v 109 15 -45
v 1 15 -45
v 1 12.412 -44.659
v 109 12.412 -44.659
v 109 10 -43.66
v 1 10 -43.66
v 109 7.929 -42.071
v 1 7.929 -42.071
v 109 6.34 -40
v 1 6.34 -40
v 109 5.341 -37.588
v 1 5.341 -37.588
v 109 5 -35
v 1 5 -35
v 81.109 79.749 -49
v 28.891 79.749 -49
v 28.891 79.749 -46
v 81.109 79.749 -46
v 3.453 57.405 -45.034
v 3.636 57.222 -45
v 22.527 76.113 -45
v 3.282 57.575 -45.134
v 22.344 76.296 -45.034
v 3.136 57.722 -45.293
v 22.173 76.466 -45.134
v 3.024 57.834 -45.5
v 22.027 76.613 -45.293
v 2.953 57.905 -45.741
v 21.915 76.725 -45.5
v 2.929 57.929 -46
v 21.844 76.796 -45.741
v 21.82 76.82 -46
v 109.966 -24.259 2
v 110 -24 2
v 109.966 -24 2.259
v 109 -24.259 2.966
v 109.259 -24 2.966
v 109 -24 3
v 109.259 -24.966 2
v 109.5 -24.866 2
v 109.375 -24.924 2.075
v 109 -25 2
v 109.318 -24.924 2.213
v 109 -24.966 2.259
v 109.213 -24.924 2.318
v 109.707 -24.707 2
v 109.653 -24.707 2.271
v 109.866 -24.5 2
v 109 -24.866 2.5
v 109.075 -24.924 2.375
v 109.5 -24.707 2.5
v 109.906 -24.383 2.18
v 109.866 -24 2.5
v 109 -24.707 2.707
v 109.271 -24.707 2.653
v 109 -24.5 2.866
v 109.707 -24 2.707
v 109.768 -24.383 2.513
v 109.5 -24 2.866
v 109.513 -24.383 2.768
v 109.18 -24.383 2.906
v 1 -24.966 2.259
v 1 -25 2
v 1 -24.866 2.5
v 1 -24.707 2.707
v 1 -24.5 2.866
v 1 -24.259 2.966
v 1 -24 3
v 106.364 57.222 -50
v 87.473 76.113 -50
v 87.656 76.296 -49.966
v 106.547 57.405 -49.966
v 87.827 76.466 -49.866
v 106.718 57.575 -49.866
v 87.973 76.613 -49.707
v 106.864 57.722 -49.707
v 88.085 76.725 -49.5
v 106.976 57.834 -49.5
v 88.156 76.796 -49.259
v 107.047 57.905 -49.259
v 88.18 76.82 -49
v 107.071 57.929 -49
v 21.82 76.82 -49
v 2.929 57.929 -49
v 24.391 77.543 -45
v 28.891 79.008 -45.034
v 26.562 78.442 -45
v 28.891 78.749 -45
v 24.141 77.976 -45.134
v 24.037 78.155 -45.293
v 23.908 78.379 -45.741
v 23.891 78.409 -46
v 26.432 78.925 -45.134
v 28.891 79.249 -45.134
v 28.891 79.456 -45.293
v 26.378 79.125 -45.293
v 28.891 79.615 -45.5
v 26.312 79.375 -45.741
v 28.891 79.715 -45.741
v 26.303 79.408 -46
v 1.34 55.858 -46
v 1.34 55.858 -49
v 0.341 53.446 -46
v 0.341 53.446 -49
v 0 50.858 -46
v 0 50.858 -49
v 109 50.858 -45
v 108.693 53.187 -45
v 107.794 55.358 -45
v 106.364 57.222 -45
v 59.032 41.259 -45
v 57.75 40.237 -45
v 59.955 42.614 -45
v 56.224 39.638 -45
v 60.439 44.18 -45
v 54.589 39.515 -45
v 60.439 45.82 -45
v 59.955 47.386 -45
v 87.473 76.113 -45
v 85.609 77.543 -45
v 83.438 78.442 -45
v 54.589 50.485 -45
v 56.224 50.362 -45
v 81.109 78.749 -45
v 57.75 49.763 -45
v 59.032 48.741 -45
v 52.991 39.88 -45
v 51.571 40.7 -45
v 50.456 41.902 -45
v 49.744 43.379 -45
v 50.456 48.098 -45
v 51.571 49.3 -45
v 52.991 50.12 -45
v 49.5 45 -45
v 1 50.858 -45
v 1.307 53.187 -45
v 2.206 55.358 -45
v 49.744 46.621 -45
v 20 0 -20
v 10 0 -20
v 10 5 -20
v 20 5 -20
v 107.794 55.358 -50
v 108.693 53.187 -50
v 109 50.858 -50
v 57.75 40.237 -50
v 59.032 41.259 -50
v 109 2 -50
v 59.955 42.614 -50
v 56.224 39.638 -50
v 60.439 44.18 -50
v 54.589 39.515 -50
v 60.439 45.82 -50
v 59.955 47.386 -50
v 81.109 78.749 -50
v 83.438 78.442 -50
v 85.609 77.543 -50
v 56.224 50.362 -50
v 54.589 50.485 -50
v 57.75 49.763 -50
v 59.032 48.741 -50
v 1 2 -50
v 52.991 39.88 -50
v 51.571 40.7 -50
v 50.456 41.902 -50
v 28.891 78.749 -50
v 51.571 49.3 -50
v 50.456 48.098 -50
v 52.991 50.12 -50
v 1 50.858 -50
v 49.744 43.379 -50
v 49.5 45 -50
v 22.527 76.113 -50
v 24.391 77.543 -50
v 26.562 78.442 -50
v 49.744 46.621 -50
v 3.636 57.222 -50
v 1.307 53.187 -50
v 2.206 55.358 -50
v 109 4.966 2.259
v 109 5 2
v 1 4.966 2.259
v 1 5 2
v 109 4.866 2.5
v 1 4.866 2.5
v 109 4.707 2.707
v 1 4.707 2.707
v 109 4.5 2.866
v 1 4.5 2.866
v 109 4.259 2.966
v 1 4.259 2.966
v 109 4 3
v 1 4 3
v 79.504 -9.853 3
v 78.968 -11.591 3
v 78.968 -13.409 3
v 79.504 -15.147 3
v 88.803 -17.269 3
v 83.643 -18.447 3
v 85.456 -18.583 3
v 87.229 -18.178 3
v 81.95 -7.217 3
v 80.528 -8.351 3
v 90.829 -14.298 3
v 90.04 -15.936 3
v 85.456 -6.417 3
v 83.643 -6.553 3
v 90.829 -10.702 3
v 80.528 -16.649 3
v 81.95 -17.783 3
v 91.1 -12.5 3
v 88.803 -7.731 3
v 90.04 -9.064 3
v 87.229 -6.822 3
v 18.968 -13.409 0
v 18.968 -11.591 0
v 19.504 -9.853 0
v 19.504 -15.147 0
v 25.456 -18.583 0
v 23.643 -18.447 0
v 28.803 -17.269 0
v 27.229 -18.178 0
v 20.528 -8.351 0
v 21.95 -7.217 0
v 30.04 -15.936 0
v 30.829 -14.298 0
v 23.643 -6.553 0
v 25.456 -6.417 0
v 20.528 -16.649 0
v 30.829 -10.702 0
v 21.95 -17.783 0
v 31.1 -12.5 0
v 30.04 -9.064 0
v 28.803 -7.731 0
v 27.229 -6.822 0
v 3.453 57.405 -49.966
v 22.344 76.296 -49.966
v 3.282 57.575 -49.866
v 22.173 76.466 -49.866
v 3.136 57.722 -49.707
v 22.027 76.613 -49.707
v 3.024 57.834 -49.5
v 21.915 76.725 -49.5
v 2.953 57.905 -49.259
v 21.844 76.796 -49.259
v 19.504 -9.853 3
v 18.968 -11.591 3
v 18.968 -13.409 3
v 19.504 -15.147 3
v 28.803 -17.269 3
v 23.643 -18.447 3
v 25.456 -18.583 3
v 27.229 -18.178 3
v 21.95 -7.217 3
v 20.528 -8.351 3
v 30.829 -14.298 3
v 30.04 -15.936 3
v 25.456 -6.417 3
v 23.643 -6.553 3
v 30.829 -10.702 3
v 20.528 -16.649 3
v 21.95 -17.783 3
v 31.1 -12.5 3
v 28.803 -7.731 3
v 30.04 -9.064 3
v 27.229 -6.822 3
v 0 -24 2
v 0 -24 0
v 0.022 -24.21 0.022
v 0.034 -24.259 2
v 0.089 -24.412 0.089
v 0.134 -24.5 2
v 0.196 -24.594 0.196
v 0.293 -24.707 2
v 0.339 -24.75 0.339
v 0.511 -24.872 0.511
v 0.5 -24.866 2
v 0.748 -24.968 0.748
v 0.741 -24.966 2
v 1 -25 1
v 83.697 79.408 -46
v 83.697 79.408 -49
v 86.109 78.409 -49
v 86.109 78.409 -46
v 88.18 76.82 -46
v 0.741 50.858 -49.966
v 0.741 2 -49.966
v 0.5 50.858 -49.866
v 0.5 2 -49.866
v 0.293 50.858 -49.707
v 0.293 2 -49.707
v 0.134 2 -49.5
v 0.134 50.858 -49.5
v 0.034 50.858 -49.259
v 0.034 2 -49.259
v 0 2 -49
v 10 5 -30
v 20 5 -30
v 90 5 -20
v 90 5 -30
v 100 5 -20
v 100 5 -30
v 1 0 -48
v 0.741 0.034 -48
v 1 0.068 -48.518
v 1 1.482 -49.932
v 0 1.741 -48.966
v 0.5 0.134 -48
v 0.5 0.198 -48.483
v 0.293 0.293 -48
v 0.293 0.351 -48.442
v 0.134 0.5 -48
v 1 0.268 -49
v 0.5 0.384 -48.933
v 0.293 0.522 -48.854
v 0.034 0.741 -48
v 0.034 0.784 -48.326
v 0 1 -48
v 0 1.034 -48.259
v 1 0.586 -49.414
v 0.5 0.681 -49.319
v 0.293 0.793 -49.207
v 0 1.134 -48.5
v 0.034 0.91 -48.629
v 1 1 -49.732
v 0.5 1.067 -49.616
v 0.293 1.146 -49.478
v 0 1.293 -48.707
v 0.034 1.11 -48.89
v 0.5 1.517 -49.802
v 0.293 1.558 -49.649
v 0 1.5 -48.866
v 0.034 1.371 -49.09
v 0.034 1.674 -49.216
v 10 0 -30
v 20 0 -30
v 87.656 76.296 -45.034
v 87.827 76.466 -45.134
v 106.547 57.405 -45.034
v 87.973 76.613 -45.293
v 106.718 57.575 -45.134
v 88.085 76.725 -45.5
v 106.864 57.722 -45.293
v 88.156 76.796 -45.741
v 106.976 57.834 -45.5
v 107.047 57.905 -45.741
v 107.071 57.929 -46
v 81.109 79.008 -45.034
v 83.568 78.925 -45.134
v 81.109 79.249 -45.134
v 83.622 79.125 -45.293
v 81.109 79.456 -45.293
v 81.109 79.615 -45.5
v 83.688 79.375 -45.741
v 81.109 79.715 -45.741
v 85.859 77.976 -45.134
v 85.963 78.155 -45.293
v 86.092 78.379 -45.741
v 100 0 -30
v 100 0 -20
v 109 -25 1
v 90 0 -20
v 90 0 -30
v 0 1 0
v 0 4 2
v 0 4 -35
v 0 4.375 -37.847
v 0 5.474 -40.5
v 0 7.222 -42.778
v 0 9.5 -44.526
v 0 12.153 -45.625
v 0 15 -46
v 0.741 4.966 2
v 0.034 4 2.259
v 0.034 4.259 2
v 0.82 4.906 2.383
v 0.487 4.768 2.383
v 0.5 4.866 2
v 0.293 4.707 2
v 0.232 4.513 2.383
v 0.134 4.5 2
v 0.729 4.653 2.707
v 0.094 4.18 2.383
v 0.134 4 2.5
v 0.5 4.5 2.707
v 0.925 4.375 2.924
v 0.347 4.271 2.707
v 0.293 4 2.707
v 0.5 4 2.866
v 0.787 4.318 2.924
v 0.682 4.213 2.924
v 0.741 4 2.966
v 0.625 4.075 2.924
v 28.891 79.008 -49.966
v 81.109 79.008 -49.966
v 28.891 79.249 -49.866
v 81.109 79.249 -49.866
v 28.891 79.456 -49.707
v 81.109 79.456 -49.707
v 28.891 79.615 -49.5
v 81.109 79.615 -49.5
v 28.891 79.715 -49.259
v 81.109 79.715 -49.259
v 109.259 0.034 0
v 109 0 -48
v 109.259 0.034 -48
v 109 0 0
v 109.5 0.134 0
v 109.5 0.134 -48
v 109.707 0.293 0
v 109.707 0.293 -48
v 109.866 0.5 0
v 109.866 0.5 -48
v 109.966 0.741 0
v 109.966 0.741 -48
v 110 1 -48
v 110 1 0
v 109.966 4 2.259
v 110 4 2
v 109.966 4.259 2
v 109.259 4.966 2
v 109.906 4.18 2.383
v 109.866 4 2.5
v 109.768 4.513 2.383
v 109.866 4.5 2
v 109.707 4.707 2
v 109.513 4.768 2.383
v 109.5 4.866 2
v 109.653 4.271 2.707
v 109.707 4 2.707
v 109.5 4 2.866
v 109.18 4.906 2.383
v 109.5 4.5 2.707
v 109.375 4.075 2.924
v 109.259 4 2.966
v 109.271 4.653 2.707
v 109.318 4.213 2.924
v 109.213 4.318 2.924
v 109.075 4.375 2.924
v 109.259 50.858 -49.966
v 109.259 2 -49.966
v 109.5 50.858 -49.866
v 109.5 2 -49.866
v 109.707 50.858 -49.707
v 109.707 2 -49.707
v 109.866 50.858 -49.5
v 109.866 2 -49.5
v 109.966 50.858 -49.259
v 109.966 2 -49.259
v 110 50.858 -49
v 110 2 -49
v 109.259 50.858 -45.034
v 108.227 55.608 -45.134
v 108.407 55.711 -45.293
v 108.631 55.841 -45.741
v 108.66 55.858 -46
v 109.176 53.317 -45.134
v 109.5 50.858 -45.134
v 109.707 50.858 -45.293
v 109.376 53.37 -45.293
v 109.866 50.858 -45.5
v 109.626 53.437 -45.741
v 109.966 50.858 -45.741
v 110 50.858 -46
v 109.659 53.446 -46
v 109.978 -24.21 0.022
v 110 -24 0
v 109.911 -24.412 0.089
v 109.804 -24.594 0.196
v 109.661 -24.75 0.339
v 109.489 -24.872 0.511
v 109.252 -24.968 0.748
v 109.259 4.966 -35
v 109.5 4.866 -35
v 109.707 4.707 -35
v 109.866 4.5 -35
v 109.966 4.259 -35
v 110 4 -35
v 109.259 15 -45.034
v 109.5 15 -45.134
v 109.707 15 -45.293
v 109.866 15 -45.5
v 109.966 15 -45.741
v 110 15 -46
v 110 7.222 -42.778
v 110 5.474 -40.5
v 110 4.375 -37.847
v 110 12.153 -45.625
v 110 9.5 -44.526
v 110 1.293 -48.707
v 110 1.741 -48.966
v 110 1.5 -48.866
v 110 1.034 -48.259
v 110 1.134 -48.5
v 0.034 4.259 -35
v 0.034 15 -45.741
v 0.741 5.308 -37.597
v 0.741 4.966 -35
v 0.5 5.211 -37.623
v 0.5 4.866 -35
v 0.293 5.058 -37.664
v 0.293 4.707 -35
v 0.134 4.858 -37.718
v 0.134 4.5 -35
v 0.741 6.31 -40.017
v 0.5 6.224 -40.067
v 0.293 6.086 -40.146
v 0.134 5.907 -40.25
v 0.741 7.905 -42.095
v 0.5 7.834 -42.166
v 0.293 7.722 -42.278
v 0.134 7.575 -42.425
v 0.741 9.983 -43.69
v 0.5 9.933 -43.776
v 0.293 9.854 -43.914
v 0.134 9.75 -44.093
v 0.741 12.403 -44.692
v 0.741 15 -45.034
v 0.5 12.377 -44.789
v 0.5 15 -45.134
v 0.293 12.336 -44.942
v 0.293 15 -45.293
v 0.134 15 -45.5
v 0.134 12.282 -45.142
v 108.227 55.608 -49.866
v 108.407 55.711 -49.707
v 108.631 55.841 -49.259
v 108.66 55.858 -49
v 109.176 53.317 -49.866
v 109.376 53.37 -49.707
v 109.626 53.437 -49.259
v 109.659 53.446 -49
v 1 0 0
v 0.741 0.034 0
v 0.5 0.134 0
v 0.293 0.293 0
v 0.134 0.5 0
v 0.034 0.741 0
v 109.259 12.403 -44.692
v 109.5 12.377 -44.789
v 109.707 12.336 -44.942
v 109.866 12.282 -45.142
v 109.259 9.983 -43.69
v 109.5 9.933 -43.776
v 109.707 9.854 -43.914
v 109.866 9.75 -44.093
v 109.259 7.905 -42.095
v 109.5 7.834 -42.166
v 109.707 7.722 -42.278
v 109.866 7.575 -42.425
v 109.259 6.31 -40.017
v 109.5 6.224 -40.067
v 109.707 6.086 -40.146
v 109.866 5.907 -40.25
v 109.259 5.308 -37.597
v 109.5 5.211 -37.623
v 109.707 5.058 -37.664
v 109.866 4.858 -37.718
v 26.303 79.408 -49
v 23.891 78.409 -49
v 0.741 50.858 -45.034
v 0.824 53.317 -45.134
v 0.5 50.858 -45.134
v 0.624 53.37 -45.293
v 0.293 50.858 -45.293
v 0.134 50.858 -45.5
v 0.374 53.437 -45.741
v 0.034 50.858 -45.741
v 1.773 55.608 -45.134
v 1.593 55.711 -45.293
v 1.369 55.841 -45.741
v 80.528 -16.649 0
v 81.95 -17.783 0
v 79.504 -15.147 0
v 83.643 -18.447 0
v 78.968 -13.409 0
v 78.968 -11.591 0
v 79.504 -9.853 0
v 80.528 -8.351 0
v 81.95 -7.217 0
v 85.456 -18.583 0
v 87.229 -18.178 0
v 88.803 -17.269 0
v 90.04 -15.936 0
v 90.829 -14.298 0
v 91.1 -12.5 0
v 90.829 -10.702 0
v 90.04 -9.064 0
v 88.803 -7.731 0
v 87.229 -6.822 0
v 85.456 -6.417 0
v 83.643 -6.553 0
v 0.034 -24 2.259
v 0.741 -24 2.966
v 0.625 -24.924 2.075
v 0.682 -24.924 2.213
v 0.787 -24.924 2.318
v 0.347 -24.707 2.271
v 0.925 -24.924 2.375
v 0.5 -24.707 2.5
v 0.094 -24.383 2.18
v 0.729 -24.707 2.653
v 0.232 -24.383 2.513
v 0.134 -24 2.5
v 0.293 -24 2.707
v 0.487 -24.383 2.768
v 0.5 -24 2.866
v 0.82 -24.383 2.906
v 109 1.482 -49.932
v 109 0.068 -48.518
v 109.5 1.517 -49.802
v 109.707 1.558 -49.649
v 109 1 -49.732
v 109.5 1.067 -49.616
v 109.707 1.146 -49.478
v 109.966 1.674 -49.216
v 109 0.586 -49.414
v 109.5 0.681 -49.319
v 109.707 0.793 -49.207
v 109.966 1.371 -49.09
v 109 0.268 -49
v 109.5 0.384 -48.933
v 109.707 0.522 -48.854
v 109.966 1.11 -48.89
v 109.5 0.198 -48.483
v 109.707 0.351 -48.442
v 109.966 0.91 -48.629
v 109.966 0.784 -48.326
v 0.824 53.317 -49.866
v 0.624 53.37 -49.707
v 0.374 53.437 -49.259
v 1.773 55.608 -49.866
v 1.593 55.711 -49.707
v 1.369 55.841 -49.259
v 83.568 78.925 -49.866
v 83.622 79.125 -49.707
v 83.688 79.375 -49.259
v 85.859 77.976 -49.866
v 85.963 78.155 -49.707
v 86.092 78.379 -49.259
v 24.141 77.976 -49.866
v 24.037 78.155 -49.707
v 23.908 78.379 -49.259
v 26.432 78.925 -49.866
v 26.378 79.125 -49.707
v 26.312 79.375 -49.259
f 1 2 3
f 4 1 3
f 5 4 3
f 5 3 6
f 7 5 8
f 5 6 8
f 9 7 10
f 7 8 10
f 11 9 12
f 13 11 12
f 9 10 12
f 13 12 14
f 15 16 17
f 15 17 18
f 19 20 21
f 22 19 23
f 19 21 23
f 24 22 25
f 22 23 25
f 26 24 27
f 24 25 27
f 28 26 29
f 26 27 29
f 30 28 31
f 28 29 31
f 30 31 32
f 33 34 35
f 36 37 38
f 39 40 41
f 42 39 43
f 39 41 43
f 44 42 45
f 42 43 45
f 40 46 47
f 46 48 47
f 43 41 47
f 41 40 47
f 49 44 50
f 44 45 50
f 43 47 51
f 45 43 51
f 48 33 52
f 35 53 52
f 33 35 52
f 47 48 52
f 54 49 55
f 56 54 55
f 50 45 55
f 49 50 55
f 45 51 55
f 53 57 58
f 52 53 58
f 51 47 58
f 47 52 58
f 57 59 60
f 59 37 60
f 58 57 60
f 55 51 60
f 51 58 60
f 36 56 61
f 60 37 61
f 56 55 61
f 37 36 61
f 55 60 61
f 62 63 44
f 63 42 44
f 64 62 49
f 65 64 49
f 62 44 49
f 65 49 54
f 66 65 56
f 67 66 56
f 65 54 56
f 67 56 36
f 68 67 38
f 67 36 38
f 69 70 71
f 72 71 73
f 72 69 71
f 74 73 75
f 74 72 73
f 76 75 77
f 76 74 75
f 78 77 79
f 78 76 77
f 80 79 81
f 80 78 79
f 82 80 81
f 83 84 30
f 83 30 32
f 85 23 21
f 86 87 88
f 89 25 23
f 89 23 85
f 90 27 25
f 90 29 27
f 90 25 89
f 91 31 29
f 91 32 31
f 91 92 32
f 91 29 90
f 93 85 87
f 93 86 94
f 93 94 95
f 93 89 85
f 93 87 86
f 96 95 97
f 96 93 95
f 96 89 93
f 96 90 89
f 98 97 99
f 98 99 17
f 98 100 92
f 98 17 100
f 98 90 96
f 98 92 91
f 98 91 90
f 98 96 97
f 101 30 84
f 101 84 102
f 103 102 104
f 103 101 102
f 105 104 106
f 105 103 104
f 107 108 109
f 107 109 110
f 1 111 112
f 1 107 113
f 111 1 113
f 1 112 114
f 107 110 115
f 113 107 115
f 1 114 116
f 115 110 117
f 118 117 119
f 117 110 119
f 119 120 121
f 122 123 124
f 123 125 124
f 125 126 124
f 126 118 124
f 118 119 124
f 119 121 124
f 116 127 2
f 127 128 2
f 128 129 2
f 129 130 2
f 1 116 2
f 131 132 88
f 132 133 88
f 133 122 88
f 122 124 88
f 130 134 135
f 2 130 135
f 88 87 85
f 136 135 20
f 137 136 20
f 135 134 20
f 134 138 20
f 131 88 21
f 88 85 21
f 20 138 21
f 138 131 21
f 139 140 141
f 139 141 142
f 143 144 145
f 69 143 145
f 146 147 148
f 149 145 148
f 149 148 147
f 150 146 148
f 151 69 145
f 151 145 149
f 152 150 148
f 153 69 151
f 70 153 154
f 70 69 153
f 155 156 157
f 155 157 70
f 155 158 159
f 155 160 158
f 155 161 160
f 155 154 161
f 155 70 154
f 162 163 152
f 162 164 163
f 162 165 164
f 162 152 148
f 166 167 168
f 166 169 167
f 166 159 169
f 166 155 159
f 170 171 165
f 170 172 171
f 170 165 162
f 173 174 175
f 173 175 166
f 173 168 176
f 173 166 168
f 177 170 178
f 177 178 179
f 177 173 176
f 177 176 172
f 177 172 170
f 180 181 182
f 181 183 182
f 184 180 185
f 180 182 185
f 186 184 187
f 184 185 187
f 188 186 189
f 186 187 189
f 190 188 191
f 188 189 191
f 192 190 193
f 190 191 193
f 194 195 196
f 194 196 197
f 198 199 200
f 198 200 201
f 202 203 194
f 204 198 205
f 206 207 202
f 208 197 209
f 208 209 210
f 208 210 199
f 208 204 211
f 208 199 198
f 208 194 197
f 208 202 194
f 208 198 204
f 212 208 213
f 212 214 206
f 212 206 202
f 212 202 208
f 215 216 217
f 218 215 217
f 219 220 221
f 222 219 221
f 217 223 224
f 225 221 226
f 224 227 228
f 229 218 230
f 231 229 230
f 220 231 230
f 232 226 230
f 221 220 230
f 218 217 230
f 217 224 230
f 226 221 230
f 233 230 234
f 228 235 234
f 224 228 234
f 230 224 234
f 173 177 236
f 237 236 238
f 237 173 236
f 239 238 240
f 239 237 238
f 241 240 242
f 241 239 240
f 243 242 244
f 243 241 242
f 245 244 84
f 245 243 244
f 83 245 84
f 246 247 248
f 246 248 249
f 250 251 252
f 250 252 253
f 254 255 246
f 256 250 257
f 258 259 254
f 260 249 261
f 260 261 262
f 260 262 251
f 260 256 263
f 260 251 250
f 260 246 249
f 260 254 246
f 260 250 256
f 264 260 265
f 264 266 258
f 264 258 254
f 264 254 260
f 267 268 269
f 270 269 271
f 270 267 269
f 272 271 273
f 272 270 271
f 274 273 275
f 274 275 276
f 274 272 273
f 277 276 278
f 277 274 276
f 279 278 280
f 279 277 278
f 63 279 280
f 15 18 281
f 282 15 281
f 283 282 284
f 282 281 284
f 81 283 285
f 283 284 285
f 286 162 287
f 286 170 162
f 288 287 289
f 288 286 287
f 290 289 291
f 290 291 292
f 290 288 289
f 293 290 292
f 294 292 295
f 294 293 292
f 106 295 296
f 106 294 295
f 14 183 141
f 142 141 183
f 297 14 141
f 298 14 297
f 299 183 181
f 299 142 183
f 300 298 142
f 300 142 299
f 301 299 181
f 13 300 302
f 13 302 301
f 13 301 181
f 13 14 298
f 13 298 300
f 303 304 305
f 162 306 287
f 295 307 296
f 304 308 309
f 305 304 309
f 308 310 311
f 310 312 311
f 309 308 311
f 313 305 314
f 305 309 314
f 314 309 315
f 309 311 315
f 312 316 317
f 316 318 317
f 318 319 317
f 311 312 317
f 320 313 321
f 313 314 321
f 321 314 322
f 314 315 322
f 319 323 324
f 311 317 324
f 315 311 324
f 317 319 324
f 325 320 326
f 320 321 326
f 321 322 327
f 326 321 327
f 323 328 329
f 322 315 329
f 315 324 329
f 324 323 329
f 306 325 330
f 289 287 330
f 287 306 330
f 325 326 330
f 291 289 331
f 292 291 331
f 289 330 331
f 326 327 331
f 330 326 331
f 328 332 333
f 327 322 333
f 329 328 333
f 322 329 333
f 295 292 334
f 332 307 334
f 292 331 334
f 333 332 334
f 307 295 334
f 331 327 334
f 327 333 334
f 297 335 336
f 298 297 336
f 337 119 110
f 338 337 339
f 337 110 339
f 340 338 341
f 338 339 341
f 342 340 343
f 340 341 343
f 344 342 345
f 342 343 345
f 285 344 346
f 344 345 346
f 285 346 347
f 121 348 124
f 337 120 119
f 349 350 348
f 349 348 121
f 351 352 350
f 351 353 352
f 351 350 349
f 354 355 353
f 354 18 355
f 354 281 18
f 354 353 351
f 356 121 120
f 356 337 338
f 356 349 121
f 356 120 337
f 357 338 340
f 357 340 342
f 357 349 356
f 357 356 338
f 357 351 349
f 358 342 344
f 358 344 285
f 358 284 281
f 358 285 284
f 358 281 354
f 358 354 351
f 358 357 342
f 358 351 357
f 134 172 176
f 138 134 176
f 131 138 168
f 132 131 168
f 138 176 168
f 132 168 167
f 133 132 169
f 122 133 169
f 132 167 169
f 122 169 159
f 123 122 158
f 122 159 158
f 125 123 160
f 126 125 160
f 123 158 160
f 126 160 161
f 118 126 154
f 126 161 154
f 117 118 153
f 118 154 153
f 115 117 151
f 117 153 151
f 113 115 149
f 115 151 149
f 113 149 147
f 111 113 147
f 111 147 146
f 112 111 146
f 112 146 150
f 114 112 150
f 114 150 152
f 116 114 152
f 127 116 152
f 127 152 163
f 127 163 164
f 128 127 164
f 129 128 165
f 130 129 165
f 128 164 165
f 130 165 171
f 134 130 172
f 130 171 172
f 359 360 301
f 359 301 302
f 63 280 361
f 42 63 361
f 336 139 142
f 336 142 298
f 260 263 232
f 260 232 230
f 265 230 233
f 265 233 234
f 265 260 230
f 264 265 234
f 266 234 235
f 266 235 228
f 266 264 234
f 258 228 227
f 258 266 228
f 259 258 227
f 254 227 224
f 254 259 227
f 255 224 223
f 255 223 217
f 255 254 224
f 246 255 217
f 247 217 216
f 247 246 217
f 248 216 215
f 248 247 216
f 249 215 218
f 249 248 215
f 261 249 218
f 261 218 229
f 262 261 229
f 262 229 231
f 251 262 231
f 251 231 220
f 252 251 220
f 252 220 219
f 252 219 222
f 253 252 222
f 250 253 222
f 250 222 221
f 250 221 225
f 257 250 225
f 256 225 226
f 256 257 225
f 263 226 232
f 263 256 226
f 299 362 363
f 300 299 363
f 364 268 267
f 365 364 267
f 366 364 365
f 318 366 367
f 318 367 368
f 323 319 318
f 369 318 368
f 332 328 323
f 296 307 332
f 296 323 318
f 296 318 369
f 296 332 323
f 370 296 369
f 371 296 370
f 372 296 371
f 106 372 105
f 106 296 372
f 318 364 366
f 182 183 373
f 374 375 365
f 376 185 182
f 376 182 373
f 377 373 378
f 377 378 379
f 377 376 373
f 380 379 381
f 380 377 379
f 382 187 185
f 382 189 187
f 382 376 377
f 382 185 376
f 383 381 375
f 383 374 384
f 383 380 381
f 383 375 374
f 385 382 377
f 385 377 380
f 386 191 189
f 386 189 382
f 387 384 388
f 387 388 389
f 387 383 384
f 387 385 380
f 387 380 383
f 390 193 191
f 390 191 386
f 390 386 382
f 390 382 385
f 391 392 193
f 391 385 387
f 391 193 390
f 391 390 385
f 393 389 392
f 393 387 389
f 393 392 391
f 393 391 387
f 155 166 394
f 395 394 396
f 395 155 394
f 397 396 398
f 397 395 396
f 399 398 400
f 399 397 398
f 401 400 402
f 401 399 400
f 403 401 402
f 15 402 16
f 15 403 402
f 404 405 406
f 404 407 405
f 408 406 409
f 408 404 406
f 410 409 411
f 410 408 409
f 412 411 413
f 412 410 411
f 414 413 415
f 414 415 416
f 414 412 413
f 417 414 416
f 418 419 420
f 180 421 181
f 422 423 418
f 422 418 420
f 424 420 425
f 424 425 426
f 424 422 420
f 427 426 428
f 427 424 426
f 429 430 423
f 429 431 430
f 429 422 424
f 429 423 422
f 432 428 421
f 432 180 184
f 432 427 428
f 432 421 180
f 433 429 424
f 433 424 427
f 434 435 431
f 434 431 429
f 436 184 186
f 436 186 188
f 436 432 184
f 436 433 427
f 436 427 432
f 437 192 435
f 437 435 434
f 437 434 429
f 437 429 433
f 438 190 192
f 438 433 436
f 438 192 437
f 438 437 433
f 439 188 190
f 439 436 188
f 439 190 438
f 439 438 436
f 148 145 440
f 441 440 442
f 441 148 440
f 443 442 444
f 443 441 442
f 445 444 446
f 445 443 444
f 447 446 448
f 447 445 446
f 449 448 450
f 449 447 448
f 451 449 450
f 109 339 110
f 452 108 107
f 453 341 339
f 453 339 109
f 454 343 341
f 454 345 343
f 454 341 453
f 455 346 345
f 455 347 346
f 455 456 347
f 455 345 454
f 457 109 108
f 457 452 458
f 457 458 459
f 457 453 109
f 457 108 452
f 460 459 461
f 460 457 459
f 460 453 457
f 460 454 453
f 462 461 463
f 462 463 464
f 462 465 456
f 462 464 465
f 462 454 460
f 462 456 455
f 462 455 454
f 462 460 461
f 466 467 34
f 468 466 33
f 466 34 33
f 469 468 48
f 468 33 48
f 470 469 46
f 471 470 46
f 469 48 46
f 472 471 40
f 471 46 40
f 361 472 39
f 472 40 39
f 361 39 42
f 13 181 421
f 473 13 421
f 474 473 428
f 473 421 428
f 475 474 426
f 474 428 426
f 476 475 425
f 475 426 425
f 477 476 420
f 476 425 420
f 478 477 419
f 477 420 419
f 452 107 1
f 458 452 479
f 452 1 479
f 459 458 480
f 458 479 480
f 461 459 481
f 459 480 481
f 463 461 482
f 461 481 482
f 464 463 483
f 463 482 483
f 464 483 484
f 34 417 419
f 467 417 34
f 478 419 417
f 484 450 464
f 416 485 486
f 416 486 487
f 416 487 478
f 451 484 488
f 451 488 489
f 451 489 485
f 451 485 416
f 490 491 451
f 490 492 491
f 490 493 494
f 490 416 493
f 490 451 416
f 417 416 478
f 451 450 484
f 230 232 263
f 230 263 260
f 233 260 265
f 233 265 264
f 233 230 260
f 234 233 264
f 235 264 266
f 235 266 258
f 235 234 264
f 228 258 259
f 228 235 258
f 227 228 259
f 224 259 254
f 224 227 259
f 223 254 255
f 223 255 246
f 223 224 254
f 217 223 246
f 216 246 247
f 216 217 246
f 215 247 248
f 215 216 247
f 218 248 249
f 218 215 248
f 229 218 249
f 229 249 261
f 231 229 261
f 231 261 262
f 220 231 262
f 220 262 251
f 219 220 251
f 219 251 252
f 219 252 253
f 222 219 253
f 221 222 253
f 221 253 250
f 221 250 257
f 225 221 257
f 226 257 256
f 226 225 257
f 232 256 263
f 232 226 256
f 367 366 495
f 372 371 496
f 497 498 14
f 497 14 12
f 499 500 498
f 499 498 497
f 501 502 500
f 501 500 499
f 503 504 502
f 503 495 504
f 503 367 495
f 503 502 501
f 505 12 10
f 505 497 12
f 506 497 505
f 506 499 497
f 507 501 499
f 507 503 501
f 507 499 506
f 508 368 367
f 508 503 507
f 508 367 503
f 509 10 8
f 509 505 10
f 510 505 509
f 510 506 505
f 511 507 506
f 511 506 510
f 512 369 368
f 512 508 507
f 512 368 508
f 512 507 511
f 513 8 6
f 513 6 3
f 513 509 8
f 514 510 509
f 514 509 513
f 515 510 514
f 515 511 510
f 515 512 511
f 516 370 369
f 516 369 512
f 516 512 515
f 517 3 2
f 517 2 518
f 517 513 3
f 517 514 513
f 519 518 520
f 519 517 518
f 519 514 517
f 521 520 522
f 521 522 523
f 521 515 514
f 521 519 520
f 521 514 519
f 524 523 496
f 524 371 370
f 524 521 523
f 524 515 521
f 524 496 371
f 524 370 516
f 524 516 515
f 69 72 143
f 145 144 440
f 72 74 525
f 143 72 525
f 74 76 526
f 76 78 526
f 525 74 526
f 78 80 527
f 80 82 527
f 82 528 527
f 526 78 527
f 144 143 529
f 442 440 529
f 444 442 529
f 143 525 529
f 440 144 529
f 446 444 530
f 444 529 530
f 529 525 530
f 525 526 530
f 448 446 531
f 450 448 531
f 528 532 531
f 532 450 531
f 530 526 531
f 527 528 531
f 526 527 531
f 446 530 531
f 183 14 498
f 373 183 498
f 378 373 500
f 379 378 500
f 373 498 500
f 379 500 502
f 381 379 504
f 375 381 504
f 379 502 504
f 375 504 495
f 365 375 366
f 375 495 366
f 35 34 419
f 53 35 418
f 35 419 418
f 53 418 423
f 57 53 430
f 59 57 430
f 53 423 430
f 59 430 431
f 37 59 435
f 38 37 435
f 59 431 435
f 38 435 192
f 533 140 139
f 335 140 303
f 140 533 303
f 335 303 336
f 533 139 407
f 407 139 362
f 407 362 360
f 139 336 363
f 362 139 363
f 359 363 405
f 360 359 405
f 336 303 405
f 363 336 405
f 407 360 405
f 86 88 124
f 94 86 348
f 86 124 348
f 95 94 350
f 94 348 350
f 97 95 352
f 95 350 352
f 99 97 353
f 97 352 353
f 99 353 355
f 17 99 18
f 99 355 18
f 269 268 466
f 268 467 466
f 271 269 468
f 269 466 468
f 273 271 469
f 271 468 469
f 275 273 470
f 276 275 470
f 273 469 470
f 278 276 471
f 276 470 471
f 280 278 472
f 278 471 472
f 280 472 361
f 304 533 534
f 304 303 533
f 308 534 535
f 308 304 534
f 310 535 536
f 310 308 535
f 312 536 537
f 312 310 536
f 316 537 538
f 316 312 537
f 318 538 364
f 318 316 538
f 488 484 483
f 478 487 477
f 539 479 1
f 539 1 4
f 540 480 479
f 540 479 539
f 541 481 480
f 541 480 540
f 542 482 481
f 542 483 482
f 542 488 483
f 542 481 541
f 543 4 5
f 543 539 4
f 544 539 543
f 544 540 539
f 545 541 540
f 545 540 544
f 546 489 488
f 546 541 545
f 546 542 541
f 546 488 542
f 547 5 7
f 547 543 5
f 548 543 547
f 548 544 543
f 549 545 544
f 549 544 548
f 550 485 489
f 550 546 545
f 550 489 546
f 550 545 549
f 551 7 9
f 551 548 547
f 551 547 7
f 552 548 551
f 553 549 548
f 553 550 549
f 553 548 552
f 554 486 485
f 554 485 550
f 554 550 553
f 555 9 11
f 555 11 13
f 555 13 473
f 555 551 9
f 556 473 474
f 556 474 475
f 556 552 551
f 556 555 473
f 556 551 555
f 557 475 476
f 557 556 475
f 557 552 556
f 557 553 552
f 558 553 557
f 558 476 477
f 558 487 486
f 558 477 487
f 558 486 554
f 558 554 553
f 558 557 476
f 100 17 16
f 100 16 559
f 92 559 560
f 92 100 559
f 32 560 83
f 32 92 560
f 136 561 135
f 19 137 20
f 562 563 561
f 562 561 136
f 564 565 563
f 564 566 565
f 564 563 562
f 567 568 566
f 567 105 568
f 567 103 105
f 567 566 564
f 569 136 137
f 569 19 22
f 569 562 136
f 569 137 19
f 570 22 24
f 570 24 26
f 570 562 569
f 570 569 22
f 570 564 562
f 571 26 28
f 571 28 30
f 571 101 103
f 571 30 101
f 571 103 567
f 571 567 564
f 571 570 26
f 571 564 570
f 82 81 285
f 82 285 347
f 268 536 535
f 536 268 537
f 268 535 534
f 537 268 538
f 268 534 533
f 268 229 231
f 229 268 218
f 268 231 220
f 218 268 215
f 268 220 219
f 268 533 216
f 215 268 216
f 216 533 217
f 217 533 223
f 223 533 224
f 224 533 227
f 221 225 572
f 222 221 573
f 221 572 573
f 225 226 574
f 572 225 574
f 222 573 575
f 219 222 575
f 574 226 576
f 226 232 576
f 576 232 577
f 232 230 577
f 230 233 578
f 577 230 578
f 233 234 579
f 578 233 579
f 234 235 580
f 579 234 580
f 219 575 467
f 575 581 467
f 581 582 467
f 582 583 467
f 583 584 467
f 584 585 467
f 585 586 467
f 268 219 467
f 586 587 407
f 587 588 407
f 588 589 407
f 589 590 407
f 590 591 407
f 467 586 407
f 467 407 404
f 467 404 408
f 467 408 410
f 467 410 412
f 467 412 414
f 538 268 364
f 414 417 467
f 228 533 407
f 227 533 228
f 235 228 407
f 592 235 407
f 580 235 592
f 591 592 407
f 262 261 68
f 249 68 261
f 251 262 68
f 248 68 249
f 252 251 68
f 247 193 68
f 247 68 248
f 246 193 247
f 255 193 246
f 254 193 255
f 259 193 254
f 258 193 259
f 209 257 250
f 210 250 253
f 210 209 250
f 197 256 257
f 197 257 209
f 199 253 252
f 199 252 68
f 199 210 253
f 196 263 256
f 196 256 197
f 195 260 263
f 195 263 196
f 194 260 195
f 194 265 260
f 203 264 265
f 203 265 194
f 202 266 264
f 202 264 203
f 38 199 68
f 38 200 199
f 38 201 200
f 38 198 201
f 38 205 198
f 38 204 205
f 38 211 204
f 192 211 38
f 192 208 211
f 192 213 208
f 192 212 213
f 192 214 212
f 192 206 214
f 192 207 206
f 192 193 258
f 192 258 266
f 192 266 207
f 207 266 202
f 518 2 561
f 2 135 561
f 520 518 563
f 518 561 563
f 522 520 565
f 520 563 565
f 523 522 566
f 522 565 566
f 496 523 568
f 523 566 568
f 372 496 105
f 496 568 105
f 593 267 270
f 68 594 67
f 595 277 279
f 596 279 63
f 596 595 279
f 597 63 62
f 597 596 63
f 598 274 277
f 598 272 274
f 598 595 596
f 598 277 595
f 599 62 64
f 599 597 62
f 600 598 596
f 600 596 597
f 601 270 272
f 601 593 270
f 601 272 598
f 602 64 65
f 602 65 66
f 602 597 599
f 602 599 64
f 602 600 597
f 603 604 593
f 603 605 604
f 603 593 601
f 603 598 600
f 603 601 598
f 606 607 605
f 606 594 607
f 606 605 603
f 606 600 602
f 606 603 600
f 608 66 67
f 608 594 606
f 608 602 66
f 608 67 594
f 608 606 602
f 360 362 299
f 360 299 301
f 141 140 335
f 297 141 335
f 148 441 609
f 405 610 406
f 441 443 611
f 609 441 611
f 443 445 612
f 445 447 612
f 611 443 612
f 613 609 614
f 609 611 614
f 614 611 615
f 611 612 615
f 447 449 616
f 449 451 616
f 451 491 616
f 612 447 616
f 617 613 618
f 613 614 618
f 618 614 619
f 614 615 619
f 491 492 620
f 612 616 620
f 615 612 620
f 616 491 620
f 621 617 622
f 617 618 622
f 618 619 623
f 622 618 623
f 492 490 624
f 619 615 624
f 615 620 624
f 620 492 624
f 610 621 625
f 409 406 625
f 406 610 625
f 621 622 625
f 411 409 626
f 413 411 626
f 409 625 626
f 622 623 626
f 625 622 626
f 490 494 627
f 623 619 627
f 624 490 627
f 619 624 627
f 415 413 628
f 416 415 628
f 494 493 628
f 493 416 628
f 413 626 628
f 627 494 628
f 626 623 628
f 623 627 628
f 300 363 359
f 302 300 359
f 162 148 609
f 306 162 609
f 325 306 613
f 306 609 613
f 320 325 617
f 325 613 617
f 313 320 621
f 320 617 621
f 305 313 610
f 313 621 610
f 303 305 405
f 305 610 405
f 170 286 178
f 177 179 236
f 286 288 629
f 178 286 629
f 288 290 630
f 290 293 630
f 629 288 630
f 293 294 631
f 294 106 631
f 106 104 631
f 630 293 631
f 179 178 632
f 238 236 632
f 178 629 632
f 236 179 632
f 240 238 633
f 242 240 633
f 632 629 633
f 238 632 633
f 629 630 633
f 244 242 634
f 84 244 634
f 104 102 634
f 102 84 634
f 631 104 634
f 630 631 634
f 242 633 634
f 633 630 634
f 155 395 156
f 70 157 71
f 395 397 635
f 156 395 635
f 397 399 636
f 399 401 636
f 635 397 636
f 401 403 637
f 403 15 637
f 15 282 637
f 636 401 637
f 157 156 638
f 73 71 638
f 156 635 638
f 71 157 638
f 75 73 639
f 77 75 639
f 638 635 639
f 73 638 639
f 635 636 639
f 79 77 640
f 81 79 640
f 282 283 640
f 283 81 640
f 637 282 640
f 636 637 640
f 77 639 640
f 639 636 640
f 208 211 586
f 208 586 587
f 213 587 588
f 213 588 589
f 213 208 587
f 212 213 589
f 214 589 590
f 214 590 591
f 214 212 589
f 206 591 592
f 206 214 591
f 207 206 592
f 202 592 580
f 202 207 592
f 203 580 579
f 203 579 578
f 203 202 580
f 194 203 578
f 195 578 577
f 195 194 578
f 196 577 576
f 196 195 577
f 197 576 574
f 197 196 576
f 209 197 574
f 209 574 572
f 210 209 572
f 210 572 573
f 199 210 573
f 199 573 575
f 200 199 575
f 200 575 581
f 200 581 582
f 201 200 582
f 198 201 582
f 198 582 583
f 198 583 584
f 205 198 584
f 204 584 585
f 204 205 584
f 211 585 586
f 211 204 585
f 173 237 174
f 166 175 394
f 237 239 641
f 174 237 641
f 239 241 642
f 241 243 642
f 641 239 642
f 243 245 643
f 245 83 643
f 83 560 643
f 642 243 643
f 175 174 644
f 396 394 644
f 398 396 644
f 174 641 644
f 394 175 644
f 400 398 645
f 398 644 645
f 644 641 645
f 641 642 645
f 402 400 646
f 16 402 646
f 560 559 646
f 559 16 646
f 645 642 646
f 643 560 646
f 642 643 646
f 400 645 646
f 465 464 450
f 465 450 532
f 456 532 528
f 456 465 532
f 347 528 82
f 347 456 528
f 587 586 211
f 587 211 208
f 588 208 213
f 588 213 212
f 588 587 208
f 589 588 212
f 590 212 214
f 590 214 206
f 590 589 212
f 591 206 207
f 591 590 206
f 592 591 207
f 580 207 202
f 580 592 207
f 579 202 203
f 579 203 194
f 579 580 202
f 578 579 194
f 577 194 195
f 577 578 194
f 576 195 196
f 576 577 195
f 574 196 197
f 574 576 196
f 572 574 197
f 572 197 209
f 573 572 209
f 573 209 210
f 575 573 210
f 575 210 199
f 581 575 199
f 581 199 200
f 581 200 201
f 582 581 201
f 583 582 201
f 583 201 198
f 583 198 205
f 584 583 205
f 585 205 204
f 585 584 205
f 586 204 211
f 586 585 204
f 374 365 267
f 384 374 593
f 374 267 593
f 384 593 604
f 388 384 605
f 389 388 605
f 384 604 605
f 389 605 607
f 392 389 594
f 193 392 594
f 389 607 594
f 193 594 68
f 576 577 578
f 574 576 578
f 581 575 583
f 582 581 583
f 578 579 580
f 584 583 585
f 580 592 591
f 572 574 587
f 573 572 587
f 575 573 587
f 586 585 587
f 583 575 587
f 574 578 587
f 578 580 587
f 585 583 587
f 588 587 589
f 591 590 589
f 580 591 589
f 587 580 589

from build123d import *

# Parameters (mm, degrees)
SKETCH1_W             = 110
SKETCH1_H             = 50
SKETCH1_W_2           = 10
SKETCH1_H_2           = 10
BOSS_EXTRUDE1_DEPTH   = 5
SKETCH2_R             = 6.1
SKETCH2_W             = 110
SKETCH2_H             = 5
BOSS_EXTRUDE2_DEPTH   = 3
SKETCH3_R             = 5.5
BOSS_EXTRUDE3_DEPTH   = 5
FILLET1_R             = 10
FILLET2_R             = 10
FILLET3_R             = 2
FILLET4_R             = 1
FILLET5_R             = 1
SKETCH4_R             = 6.1
BOSS_EXTRUDE4_DEPTH   = 3
BOSS_EXTRUDE4_2_DEPTH = 3


with BuildPart() as part:
    # Sketch1 → Boss-Extrude1 (new body)
    with BuildSketch(Plane(origin=(0, 0, 0), x_dir=(1, 0, 0), z_dir=(0, 1, 0))):
        with Locations((55, 25)):
            Rectangle(SKETCH1_W, SKETCH1_H)
        with Locations((15, 25)):
            Rectangle(SKETCH1_W_2, SKETCH1_H_2, mode=Mode.SUBTRACT)
        with Locations((95, 25)):
            Rectangle(SKETCH1_W_2, SKETCH1_H_2, mode=Mode.SUBTRACT)
    extrude(amount=BOSS_EXTRUDE1_DEPTH)

    # Sketch2 → Boss-Extrude2 (add)
    with BuildSketch(Plane.XY):
        Polygon((0, 0), (0, -25), (25, -25), (85, -25), (110, -25), (110, 0), align=None)
        with Locations((25, -12.5)):
            Circle(SKETCH2_R, mode=Mode.SUBTRACT)
        with Locations((85, -12.5)):
            Circle(SKETCH2_R, mode=Mode.SUBTRACT)
        with Locations((55, 2.5)):
            Rectangle(SKETCH2_W, SKETCH2_H)
    extrude(amount=BOSS_EXTRUDE2_DEPTH)

    # Sketch3 → Boss-Extrude3 (add)
    with BuildSketch(Plane(origin=(0, 0, -50), x_dir=(-1, 0, 0), z_dir=(0, 0, -1))):
        Polygon((-110, 5), (0, 5), (0, 55), (-24.748737342, 79.748737342), (-85.251262658, 79.748737342), (-110, 55), align=None)
        with Locations((-55, 45)):
            Circle(SKETCH3_R, mode=Mode.SUBTRACT)
    extrude(amount=-BOSS_EXTRUDE3_DEPTH)

    # Fillet1
    fillet1_edges = [part.edges().sort_by_distance(p)[0] for p in [
        (0, 55, -47.5),
        (110, 55, -47.5),
        (85.251262658, 79.748737342, -47.5),
        (24.748737342, 79.748737342, -47.5),
    ]]
    fillet(fillet1_edges, radius=FILLET1_R)

    # Fillet2
    fillet2_edges = [part.edges().sort_by_distance(p)[0] for p in [
        (55, 5, -45),
    ]]
    fillet(fillet2_edges, radius=FILLET2_R)

    # Fillet3
    fillet3_edges = [part.edges().sort_by_distance(p)[0] for p in [
        (55, 0, -50),
    ]]
    fillet(fillet3_edges, radius=FILLET3_R)

    # Fillet4
    fillet4_edges = [part.edges().sort_by_distance(p)[0] for p in [
        (0, 32.928932188, -45),
        (0, 5, -16),
        (110, 7.928932188, -42.071067812),
        (0, 7.928932188, -42.071067812),
        (0, 0, -24),
        (0, 0.585786438, -49.414213562),
        (110, 0.585786438, -49.414213562),
        (110, 5, -16),
        (110, 0, -24),
        (55, 79.748737342, -50),
        (55, 79.748737342, -45),
        (0, 26.428932188, -50),
        (12.374368671, 67.374368671, -50),
        (97.625631329, 67.374368671, -50),
        (110, 26.428932188, -50),
        (25.064038642, 78.987532667, -50),
        (0.761204675, 54.6846987, -50),
        (109.238795325, 54.6846987, -50),
        (84.935961358, 78.987532667, -50),
        (97.625631329, 67.374368671, -45),
        (110, 32.928932188, -45),
        (12.374368671, 67.374368671, -45),
        (25.064038642, 78.987532667, -45),
        (0.761204675, 54.6846987, -45),
        (109.238795325, 54.6846987, -45),
        (84.935961358, 78.987532667, -45),
    ]]
    fillet(fillet4_edges, radius=FILLET4_R)

    # Fillet5
    fillet5_edges = [part.edges().sort_by_distance(p)[0] for p in [
        (110, -10.5, 3),
        (0, -10.5, 3),
        (55, 5, 3),
        (0.292893219, 4.707106781, 3),
        (109.707106781, 4.707106781, 3),
        (110, -25, 1.5),
        (55, -25, 0),
        (0, -25, 1.5),
        (55, -25, 3),
    ]]
    fillet(fillet5_edges, radius=FILLET5_R)


with BuildPart() as body_2:
    # Sketch4 → Boss-Extrude4 (new body)
    with BuildSketch(Plane.XY.offset(3)):
        with Locations((25, -12.5)):
            Circle(SKETCH4_R)
    extrude(amount=-BOSS_EXTRUDE4_DEPTH)


with BuildPart() as body_3:
    # Sketch4 → Boss-Extrude4 2 (new body)
    with BuildSketch(Plane.XY.offset(3)):
        with Locations((85, -12.5)):
            Circle(SKETCH4_R)
    extrude(amount=-BOSS_EXTRUDE4_2_DEPTH)


solid = Compound([part.part, body_2.part, body_3.part])
